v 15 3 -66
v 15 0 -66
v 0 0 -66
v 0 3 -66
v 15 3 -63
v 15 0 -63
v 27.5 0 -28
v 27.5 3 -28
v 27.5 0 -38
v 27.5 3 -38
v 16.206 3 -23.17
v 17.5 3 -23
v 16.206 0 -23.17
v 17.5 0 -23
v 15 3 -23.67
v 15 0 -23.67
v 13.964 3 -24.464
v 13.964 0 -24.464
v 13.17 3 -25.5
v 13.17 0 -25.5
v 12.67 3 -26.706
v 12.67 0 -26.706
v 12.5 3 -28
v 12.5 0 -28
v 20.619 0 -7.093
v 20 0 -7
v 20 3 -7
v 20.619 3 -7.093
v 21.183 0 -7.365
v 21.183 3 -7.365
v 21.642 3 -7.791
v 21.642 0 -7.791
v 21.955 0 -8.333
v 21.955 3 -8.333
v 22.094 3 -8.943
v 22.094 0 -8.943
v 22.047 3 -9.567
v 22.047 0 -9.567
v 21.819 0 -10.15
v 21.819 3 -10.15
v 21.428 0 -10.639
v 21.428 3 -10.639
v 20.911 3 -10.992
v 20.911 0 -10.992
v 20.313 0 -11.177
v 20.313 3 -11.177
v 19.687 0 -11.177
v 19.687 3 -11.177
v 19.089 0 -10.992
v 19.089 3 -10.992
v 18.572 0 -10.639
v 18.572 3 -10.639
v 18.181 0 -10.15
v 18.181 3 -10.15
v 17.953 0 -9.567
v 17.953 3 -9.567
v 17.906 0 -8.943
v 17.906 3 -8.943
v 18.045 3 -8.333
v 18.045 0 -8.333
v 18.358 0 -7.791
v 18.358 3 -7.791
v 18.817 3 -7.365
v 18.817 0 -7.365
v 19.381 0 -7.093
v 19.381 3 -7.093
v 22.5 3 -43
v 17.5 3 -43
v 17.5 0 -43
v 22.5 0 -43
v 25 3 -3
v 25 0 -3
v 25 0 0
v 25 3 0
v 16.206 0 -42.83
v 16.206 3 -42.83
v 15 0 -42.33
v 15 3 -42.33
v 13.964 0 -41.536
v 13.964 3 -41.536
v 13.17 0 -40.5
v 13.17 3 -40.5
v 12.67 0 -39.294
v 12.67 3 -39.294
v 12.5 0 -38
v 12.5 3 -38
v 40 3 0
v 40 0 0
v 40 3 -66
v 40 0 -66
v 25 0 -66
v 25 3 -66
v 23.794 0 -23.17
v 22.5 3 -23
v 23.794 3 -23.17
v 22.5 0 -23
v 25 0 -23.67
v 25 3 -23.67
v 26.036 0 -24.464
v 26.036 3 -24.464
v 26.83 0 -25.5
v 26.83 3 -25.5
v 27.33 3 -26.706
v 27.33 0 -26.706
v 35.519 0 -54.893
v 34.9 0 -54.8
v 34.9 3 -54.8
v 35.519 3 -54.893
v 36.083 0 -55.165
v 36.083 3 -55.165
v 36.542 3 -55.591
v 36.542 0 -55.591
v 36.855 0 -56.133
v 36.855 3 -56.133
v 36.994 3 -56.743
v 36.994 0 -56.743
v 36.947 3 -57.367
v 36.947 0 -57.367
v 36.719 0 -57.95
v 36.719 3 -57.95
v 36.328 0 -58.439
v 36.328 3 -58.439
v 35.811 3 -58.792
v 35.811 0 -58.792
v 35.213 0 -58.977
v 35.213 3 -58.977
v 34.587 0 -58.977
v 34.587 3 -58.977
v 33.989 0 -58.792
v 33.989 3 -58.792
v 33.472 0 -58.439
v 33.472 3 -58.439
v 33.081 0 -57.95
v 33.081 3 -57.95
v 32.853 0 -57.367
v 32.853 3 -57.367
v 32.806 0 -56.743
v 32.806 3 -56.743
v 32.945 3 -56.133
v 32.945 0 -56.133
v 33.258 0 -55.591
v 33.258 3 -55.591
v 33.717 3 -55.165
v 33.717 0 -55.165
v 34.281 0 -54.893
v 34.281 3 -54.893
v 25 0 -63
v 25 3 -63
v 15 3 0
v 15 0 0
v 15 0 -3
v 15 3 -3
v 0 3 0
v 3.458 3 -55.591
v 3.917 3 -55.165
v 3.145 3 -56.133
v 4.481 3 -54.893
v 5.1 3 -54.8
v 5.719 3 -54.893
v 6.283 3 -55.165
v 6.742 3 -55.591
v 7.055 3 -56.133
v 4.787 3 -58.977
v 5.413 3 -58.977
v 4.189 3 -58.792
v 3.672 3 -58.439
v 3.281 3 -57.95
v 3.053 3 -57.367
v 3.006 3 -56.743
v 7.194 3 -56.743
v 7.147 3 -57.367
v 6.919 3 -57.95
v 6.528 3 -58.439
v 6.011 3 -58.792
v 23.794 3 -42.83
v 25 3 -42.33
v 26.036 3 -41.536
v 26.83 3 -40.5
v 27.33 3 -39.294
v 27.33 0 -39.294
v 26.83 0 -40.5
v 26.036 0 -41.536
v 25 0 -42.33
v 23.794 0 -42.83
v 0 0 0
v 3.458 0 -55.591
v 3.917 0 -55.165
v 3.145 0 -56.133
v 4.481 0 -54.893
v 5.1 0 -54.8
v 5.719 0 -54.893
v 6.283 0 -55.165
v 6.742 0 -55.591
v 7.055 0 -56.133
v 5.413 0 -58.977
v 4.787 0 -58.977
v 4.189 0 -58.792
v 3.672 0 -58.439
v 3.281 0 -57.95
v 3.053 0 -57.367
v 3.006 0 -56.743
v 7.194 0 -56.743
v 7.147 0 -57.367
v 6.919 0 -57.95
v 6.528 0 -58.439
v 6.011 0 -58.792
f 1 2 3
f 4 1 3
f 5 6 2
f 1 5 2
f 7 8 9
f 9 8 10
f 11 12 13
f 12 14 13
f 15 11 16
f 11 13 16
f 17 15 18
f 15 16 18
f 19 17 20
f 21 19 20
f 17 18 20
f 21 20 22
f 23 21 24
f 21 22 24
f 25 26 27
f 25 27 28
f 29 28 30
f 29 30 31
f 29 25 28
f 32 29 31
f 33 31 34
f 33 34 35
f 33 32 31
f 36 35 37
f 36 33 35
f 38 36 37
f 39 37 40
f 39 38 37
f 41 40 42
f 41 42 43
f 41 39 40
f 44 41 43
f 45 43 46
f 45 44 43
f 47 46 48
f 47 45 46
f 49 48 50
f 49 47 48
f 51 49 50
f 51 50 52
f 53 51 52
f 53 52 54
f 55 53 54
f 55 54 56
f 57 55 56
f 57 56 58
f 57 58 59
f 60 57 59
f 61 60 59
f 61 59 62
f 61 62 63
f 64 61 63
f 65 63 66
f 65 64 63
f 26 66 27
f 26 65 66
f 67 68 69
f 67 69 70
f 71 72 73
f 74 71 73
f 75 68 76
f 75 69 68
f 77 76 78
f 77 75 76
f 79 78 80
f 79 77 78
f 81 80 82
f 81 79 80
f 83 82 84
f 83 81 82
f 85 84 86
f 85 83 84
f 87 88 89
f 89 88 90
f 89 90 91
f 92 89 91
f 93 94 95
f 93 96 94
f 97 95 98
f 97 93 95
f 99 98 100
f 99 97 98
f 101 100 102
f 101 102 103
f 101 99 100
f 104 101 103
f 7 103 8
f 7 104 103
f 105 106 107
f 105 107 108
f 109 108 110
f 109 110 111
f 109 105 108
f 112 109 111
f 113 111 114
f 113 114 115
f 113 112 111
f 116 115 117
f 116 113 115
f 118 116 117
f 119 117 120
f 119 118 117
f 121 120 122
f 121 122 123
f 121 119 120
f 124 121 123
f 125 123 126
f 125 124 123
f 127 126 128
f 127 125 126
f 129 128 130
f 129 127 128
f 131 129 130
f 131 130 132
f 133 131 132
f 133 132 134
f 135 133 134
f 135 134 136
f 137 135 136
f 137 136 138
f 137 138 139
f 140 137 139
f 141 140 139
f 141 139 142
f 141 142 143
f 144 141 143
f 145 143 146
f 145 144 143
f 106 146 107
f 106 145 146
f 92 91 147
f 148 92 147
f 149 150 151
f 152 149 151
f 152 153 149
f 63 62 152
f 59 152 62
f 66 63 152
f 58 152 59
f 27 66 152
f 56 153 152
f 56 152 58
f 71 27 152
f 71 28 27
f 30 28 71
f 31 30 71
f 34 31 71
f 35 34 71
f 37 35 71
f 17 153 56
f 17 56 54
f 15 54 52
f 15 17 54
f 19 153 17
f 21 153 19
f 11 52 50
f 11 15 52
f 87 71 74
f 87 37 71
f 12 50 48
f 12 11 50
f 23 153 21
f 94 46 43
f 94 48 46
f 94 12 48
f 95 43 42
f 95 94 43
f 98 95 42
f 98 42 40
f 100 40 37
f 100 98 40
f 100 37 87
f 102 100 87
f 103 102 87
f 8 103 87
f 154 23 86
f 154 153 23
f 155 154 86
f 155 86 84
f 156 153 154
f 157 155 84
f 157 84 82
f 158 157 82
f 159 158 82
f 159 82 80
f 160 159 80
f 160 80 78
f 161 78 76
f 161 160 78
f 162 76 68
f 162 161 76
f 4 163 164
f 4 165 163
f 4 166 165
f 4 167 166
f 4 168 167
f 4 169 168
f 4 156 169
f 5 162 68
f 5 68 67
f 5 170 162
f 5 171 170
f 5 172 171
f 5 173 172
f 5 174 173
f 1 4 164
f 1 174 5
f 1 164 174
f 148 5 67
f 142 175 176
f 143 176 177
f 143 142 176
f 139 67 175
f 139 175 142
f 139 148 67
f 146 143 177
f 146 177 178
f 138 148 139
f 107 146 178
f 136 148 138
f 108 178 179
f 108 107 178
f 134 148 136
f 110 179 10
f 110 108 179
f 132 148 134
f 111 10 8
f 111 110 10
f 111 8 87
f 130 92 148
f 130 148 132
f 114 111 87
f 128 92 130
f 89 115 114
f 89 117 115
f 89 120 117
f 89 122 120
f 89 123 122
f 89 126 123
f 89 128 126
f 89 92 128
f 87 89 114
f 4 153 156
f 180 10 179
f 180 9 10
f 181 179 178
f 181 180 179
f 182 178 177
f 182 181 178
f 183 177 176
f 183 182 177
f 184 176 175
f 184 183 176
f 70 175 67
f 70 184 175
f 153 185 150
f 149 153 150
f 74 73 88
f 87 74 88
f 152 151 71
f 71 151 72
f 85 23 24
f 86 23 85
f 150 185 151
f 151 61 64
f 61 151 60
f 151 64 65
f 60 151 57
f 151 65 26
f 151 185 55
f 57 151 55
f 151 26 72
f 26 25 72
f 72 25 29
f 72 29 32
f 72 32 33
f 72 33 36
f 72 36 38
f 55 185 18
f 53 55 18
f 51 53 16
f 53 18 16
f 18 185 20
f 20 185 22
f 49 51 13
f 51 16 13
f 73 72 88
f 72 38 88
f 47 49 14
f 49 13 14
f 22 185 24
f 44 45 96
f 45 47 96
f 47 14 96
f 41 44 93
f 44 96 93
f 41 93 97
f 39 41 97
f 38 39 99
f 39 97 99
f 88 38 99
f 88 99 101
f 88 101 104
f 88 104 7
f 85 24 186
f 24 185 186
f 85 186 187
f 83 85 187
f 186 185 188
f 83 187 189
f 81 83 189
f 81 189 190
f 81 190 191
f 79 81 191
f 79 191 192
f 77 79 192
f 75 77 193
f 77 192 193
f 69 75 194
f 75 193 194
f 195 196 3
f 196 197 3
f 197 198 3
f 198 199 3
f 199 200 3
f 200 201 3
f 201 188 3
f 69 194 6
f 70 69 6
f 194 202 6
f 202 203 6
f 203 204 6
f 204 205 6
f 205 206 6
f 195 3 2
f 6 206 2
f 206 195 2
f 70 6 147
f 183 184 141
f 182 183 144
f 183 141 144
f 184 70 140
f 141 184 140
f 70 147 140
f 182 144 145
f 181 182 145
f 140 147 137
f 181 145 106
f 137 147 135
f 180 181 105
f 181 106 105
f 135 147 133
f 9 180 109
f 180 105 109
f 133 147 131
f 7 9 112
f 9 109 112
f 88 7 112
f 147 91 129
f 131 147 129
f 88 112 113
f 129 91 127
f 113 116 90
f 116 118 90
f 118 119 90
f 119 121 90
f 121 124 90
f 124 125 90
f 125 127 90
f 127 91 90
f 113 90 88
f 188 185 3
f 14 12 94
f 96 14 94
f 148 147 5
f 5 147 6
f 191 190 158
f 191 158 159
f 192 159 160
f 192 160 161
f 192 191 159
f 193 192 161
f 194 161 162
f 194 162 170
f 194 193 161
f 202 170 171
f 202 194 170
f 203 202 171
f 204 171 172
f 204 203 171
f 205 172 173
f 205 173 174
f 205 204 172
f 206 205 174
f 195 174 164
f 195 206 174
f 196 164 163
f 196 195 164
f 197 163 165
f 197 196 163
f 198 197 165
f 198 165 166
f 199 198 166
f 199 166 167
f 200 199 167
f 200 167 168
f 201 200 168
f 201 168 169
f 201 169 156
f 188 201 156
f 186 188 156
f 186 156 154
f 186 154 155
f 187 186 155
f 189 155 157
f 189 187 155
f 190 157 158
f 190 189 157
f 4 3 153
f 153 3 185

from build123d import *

# Parameters (mm, degrees)
SKETCH1_R           = 2.1
BOSS_EXTRUDE1_DEPTH = 3
SKETCH3_W           = 15
SKETCH3_H           = 20
CUT_EXTRUDE1_DEPTH  = 78.233412459
FILLET1_R           = 5


with BuildPart() as part:
    # Sketch1 → Boss-Extrude1 (new body)
    with BuildSketch(Plane(origin=(0, 0, 0), x_dir=(1, 0, 0), z_dir=(0, 1, 0))):
        Polygon((0, 0), (15, 0), (15, 3), (25, 3), (25, 0), (40, 0), (40, 66), (25, 66), (25, 63), (15, 63), (15, 66), (0, 66), align=None)
        with Locations(Location((34.9, 56.9, 0), (0, 0, 270))):
            Circle(SKETCH1_R, mode=Mode.SUBTRACT)
        with Locations(Location((20, 9.1, 0), (0, 0, 270))):
            Circle(SKETCH1_R, mode=Mode.SUBTRACT)
        with Locations(Location((5.1, 56.9, 0), (0, 0, 270))):
            Circle(SKETCH1_R, mode=Mode.SUBTRACT)
    extrude(amount=BOSS_EXTRUDE1_DEPTH)

    # Sketch3 → Cut-Extrude1 (cut, through all)
    with BuildSketch(Plane(origin=(0, 3, 0), x_dir=(1, 0, 0), z_dir=(0, 1, 0))):
        with Locations((20, 33)):
            Rectangle(SKETCH3_W, SKETCH3_H)
    extrude(amount=-CUT_EXTRUDE1_DEPTH, mode=Mode.SUBTRACT)

    # Fillet1
    fillet1_edges = [part.edges().sort_by_distance(p)[0] for p in [
        (12.5, 1.5, -23),
        (12.5, 1.5, -43),
        (27.5, 1.5, -43),
        (27.5, 1.5, -23),
    ]]
    fillet(fillet1_edges, radius=FILLET1_R)


solid = part.part
